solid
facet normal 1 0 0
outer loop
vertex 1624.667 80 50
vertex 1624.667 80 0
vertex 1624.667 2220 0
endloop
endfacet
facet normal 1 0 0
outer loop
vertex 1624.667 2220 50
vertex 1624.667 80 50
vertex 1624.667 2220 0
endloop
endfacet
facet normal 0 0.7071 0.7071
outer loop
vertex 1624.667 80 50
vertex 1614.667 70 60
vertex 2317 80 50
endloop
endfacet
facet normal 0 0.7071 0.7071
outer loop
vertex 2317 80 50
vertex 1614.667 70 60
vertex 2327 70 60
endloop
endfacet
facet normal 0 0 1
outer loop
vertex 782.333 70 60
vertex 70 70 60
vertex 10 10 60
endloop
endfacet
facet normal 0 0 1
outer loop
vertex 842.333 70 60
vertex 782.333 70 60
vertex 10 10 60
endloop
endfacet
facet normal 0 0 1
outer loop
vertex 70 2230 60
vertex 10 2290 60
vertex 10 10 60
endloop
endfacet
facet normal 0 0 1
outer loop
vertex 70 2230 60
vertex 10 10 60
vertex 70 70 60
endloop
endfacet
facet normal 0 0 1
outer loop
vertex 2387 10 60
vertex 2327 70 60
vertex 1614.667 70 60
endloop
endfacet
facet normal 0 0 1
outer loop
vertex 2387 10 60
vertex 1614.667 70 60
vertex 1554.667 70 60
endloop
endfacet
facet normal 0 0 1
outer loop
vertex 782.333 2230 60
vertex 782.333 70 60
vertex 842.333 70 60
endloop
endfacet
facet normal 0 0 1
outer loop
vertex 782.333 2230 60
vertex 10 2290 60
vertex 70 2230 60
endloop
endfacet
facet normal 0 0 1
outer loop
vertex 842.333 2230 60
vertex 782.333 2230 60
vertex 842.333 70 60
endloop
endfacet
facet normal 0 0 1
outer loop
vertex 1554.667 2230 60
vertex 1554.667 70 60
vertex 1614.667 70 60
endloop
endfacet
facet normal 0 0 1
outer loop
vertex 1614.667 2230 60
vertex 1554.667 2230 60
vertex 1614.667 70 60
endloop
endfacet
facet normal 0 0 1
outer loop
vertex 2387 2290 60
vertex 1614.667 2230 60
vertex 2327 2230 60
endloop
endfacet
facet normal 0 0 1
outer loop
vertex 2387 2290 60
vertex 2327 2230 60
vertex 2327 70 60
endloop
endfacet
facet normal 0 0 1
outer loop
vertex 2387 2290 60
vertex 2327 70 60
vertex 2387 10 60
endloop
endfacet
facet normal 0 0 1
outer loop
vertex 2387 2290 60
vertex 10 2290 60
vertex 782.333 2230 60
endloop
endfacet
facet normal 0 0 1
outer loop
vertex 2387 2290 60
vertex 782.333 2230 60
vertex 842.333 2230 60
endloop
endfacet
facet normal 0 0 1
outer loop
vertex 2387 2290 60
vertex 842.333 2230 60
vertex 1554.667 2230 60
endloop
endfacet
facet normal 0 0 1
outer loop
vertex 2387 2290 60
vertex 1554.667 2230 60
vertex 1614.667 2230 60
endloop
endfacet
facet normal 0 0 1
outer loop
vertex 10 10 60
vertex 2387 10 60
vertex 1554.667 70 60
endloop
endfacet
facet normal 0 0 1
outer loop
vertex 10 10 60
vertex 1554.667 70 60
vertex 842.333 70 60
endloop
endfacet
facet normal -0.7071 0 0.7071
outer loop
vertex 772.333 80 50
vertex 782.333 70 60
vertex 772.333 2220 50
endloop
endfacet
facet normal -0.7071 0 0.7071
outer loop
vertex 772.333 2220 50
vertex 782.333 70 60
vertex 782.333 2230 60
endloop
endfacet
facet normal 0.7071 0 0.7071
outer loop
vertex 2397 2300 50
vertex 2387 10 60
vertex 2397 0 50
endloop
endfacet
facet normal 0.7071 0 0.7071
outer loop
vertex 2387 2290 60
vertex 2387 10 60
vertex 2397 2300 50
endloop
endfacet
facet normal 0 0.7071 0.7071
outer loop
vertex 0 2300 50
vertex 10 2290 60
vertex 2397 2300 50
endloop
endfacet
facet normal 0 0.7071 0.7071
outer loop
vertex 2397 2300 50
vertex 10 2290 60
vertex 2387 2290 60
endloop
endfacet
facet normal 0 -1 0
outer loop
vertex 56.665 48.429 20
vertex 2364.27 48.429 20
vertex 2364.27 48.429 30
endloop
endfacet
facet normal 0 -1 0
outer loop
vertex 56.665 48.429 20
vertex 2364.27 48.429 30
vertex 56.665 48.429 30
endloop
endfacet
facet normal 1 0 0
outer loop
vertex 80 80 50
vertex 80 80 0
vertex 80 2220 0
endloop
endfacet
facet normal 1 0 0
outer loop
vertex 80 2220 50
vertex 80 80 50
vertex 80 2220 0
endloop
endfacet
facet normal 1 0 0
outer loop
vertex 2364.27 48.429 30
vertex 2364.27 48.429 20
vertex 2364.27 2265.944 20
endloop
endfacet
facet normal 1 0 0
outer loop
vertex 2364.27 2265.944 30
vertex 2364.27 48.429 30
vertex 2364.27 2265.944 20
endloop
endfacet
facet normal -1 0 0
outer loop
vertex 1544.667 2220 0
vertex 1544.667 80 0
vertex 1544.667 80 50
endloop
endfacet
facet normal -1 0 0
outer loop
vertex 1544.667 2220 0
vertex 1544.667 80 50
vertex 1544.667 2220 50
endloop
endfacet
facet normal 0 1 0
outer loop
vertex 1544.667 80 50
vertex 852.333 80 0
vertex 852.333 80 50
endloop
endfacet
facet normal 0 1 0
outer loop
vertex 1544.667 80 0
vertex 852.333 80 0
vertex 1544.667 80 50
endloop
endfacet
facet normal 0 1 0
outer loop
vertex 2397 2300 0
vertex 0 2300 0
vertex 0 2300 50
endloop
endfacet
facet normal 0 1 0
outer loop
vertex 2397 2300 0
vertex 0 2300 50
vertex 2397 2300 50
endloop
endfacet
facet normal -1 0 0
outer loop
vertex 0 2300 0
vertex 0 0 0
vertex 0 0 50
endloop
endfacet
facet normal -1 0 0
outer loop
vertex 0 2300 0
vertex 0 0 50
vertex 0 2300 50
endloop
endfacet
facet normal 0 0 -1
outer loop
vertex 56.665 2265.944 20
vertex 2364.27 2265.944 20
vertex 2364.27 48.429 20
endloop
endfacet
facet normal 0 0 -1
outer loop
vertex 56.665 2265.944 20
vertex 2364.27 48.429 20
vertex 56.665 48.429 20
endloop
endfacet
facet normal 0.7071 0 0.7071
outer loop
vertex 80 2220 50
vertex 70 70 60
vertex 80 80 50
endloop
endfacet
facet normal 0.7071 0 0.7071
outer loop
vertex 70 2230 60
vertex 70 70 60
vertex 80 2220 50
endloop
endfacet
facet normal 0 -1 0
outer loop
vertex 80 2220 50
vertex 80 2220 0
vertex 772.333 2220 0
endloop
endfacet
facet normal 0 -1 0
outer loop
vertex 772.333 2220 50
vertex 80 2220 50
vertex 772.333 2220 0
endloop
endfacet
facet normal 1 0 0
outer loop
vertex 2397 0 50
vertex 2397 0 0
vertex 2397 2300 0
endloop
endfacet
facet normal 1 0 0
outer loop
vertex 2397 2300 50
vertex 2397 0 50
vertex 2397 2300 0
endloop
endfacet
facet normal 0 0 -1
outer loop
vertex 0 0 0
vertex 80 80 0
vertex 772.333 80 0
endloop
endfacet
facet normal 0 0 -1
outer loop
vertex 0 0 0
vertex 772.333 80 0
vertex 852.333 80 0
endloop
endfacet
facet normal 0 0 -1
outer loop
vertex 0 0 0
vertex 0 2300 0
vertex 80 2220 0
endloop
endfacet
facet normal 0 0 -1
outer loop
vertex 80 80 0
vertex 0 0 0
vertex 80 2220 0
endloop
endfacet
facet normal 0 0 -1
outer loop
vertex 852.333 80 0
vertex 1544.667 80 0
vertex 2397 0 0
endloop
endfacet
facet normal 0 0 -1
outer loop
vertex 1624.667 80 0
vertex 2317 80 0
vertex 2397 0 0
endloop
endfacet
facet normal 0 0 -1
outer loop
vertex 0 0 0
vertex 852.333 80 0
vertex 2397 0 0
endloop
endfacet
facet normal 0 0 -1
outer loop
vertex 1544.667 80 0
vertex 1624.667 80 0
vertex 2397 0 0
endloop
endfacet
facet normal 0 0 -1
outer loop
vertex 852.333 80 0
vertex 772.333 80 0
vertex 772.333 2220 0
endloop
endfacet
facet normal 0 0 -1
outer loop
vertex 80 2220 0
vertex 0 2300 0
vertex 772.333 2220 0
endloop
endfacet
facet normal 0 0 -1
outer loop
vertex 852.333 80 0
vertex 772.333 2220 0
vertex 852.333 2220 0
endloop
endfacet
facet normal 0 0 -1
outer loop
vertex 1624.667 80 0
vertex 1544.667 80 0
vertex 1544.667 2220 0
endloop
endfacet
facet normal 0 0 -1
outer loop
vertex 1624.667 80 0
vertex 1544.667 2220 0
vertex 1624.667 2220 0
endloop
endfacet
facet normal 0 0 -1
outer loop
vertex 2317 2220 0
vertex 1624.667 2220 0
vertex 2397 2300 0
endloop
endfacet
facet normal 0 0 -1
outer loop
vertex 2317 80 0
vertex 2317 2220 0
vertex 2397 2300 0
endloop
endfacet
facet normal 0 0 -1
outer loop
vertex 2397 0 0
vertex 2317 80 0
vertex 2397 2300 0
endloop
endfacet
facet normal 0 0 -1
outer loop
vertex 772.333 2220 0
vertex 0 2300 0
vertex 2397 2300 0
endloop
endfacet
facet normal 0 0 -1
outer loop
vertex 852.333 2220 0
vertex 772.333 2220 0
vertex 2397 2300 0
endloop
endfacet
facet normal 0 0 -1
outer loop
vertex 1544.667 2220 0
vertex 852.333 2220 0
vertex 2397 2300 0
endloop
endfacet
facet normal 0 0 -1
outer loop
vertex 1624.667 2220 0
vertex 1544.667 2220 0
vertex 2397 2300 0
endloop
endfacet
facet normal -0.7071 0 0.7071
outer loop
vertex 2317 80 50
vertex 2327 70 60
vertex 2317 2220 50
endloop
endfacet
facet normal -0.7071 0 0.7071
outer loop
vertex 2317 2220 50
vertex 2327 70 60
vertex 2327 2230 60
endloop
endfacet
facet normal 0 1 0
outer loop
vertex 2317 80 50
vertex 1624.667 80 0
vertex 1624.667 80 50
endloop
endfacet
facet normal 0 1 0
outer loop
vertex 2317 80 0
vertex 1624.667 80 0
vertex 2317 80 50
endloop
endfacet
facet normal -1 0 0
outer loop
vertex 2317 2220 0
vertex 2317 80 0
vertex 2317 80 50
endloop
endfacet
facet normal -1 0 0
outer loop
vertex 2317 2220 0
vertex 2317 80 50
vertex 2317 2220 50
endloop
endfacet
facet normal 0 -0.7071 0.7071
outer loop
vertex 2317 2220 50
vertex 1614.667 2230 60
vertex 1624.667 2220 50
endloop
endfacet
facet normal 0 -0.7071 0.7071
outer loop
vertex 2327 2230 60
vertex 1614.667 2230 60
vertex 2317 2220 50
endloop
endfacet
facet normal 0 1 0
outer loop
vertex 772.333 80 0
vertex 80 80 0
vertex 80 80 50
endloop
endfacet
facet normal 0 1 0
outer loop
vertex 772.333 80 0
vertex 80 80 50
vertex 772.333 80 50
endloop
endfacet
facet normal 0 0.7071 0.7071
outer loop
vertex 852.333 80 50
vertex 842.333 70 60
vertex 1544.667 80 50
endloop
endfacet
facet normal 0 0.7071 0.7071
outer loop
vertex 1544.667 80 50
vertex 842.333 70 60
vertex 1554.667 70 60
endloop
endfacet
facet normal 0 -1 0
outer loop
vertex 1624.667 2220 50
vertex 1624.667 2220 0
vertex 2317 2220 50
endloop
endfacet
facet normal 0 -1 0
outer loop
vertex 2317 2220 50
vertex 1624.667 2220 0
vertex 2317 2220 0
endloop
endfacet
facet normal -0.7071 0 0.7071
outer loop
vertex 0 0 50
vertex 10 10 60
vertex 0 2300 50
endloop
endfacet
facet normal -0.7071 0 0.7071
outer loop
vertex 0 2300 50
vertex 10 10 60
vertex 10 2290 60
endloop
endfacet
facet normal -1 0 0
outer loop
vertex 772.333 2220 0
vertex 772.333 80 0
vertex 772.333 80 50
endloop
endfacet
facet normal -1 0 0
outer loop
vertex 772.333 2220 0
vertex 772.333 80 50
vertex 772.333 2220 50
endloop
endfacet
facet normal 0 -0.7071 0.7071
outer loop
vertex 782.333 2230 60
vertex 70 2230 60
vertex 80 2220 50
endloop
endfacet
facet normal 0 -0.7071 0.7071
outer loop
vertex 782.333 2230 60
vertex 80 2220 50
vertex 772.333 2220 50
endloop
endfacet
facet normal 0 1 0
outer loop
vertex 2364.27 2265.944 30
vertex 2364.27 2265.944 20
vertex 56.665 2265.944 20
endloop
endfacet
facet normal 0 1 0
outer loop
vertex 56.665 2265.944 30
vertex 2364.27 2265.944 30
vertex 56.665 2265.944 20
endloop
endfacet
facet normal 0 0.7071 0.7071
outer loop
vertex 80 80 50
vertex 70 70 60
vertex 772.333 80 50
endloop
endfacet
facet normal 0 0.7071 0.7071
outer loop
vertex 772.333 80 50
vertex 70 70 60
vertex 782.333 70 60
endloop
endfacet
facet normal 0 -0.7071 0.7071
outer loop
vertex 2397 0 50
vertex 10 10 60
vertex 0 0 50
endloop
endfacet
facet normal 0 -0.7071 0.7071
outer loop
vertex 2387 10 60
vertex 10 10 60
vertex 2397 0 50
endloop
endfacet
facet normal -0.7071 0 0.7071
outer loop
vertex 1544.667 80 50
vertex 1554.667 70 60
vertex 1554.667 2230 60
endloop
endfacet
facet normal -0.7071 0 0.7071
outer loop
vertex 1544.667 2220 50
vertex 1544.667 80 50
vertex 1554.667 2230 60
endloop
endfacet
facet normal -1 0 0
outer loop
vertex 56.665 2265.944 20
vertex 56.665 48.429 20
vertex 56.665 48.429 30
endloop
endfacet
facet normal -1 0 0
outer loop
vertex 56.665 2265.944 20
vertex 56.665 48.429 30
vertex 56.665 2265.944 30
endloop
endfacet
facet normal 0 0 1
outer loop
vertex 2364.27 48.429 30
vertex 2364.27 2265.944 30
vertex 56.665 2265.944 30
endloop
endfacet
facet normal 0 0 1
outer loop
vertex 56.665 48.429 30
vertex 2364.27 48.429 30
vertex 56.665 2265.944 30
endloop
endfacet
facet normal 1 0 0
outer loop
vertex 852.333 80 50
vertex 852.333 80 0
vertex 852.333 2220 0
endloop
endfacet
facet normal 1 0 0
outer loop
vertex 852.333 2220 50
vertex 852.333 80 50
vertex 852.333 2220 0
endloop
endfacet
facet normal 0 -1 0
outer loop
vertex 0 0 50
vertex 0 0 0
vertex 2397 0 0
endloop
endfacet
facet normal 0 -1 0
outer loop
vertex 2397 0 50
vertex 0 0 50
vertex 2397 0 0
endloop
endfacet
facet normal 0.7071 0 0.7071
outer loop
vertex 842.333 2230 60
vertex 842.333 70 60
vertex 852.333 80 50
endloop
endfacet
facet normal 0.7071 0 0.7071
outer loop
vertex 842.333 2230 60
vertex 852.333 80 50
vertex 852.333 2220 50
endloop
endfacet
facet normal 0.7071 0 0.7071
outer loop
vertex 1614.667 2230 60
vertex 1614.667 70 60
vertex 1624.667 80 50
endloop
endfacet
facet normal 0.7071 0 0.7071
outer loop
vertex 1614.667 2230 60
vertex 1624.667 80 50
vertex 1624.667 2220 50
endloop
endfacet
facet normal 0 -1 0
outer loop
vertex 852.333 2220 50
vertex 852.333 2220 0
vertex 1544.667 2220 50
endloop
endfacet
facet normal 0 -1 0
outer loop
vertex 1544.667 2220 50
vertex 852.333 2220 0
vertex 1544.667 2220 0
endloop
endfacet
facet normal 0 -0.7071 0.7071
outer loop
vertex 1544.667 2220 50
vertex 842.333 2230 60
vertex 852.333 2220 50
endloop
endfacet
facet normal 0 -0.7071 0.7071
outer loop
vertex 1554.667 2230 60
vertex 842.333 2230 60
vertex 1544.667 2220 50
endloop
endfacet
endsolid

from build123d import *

# Parameters (mm, degrees)
SKETCH_1_W      = 2397
SKETCH_1_H      = 2300
SKETCH_1_W_2    = 692.333333333
SKETCH_1_H_2    = 2140
SKETCH_1_W_3    = 692.333333334
EXTRUDE_1_DEPTH = 60
CHAMFER_1_SIZE  = 10
EXTRUDE_START   = -20
SKETCH_2_W      = 2307.605428766
SKETCH_2_H      = 2217.514902177
EXTRUDE_2_DEPTH = 10


with BuildPart() as part:
    # Эскиз1 → Бобышка-Вытянуть1 (new body)
    with BuildSketch(Plane.XY):
        with Locations((1198.5, 1150)):
            Rectangle(SKETCH_1_W, SKETCH_1_H)
        with Locations((426.166666667, 1150)):
            Rectangle(SKETCH_1_W_2, SKETCH_1_H_2, mode=Mode.SUBTRACT)
        with Locations((1970.833333333, 1150)):
            Rectangle(SKETCH_1_W_2, SKETCH_1_H_2, mode=Mode.SUBTRACT)
        with Locations((1198.5, 1150)):
            Rectangle(SKETCH_1_W_3, SKETCH_1_H_2, mode=Mode.SUBTRACT)
    extrude(amount=EXTRUDE_1_DEPTH)

    # Фаска1
    chamfer_1_edges = [part.edges().sort_by_distance(p)[0] for p in [
        (2397, 1150, 60),
        (426.166666667, 80, 60),
        (1198.5, 2300, 60),
        (772.333333333, 1150, 60),
        (426.166666667, 2220, 60),
        (80, 1150, 60),
        (1970.833333333, 2220, 60),
        (1624.666666667, 1150, 60),
        (1970.833333333, 80, 60),
        (2317, 1150, 60),
        (1198.5, 2220, 60),
        (852.333333333, 1150, 60),
        (1198.5, 80, 60),
        (1544.666666667, 1150, 60),
        (0, 1150, 60),
        (1198.5, 0, 60),
    ]]
    chamfer(chamfer_1_edges, length=CHAMFER_1_SIZE)


with BuildPart() as body_2:
    # Эскиз2 → Бобышка-Вытянуть2 (new body)
    with BuildSketch(Plane(origin=(0, 0, 0), x_dir=(-1, 0, 0), z_dir=(0, 0, -1)).offset(EXTRUDE_START)):
        with Locations((-1210.467720162, 1157.186169315)):
            Rectangle(SKETCH_2_W, SKETCH_2_H)
    extrude(amount=-EXTRUDE_2_DEPTH)


solid = Compound([part.part, body_2.part])
